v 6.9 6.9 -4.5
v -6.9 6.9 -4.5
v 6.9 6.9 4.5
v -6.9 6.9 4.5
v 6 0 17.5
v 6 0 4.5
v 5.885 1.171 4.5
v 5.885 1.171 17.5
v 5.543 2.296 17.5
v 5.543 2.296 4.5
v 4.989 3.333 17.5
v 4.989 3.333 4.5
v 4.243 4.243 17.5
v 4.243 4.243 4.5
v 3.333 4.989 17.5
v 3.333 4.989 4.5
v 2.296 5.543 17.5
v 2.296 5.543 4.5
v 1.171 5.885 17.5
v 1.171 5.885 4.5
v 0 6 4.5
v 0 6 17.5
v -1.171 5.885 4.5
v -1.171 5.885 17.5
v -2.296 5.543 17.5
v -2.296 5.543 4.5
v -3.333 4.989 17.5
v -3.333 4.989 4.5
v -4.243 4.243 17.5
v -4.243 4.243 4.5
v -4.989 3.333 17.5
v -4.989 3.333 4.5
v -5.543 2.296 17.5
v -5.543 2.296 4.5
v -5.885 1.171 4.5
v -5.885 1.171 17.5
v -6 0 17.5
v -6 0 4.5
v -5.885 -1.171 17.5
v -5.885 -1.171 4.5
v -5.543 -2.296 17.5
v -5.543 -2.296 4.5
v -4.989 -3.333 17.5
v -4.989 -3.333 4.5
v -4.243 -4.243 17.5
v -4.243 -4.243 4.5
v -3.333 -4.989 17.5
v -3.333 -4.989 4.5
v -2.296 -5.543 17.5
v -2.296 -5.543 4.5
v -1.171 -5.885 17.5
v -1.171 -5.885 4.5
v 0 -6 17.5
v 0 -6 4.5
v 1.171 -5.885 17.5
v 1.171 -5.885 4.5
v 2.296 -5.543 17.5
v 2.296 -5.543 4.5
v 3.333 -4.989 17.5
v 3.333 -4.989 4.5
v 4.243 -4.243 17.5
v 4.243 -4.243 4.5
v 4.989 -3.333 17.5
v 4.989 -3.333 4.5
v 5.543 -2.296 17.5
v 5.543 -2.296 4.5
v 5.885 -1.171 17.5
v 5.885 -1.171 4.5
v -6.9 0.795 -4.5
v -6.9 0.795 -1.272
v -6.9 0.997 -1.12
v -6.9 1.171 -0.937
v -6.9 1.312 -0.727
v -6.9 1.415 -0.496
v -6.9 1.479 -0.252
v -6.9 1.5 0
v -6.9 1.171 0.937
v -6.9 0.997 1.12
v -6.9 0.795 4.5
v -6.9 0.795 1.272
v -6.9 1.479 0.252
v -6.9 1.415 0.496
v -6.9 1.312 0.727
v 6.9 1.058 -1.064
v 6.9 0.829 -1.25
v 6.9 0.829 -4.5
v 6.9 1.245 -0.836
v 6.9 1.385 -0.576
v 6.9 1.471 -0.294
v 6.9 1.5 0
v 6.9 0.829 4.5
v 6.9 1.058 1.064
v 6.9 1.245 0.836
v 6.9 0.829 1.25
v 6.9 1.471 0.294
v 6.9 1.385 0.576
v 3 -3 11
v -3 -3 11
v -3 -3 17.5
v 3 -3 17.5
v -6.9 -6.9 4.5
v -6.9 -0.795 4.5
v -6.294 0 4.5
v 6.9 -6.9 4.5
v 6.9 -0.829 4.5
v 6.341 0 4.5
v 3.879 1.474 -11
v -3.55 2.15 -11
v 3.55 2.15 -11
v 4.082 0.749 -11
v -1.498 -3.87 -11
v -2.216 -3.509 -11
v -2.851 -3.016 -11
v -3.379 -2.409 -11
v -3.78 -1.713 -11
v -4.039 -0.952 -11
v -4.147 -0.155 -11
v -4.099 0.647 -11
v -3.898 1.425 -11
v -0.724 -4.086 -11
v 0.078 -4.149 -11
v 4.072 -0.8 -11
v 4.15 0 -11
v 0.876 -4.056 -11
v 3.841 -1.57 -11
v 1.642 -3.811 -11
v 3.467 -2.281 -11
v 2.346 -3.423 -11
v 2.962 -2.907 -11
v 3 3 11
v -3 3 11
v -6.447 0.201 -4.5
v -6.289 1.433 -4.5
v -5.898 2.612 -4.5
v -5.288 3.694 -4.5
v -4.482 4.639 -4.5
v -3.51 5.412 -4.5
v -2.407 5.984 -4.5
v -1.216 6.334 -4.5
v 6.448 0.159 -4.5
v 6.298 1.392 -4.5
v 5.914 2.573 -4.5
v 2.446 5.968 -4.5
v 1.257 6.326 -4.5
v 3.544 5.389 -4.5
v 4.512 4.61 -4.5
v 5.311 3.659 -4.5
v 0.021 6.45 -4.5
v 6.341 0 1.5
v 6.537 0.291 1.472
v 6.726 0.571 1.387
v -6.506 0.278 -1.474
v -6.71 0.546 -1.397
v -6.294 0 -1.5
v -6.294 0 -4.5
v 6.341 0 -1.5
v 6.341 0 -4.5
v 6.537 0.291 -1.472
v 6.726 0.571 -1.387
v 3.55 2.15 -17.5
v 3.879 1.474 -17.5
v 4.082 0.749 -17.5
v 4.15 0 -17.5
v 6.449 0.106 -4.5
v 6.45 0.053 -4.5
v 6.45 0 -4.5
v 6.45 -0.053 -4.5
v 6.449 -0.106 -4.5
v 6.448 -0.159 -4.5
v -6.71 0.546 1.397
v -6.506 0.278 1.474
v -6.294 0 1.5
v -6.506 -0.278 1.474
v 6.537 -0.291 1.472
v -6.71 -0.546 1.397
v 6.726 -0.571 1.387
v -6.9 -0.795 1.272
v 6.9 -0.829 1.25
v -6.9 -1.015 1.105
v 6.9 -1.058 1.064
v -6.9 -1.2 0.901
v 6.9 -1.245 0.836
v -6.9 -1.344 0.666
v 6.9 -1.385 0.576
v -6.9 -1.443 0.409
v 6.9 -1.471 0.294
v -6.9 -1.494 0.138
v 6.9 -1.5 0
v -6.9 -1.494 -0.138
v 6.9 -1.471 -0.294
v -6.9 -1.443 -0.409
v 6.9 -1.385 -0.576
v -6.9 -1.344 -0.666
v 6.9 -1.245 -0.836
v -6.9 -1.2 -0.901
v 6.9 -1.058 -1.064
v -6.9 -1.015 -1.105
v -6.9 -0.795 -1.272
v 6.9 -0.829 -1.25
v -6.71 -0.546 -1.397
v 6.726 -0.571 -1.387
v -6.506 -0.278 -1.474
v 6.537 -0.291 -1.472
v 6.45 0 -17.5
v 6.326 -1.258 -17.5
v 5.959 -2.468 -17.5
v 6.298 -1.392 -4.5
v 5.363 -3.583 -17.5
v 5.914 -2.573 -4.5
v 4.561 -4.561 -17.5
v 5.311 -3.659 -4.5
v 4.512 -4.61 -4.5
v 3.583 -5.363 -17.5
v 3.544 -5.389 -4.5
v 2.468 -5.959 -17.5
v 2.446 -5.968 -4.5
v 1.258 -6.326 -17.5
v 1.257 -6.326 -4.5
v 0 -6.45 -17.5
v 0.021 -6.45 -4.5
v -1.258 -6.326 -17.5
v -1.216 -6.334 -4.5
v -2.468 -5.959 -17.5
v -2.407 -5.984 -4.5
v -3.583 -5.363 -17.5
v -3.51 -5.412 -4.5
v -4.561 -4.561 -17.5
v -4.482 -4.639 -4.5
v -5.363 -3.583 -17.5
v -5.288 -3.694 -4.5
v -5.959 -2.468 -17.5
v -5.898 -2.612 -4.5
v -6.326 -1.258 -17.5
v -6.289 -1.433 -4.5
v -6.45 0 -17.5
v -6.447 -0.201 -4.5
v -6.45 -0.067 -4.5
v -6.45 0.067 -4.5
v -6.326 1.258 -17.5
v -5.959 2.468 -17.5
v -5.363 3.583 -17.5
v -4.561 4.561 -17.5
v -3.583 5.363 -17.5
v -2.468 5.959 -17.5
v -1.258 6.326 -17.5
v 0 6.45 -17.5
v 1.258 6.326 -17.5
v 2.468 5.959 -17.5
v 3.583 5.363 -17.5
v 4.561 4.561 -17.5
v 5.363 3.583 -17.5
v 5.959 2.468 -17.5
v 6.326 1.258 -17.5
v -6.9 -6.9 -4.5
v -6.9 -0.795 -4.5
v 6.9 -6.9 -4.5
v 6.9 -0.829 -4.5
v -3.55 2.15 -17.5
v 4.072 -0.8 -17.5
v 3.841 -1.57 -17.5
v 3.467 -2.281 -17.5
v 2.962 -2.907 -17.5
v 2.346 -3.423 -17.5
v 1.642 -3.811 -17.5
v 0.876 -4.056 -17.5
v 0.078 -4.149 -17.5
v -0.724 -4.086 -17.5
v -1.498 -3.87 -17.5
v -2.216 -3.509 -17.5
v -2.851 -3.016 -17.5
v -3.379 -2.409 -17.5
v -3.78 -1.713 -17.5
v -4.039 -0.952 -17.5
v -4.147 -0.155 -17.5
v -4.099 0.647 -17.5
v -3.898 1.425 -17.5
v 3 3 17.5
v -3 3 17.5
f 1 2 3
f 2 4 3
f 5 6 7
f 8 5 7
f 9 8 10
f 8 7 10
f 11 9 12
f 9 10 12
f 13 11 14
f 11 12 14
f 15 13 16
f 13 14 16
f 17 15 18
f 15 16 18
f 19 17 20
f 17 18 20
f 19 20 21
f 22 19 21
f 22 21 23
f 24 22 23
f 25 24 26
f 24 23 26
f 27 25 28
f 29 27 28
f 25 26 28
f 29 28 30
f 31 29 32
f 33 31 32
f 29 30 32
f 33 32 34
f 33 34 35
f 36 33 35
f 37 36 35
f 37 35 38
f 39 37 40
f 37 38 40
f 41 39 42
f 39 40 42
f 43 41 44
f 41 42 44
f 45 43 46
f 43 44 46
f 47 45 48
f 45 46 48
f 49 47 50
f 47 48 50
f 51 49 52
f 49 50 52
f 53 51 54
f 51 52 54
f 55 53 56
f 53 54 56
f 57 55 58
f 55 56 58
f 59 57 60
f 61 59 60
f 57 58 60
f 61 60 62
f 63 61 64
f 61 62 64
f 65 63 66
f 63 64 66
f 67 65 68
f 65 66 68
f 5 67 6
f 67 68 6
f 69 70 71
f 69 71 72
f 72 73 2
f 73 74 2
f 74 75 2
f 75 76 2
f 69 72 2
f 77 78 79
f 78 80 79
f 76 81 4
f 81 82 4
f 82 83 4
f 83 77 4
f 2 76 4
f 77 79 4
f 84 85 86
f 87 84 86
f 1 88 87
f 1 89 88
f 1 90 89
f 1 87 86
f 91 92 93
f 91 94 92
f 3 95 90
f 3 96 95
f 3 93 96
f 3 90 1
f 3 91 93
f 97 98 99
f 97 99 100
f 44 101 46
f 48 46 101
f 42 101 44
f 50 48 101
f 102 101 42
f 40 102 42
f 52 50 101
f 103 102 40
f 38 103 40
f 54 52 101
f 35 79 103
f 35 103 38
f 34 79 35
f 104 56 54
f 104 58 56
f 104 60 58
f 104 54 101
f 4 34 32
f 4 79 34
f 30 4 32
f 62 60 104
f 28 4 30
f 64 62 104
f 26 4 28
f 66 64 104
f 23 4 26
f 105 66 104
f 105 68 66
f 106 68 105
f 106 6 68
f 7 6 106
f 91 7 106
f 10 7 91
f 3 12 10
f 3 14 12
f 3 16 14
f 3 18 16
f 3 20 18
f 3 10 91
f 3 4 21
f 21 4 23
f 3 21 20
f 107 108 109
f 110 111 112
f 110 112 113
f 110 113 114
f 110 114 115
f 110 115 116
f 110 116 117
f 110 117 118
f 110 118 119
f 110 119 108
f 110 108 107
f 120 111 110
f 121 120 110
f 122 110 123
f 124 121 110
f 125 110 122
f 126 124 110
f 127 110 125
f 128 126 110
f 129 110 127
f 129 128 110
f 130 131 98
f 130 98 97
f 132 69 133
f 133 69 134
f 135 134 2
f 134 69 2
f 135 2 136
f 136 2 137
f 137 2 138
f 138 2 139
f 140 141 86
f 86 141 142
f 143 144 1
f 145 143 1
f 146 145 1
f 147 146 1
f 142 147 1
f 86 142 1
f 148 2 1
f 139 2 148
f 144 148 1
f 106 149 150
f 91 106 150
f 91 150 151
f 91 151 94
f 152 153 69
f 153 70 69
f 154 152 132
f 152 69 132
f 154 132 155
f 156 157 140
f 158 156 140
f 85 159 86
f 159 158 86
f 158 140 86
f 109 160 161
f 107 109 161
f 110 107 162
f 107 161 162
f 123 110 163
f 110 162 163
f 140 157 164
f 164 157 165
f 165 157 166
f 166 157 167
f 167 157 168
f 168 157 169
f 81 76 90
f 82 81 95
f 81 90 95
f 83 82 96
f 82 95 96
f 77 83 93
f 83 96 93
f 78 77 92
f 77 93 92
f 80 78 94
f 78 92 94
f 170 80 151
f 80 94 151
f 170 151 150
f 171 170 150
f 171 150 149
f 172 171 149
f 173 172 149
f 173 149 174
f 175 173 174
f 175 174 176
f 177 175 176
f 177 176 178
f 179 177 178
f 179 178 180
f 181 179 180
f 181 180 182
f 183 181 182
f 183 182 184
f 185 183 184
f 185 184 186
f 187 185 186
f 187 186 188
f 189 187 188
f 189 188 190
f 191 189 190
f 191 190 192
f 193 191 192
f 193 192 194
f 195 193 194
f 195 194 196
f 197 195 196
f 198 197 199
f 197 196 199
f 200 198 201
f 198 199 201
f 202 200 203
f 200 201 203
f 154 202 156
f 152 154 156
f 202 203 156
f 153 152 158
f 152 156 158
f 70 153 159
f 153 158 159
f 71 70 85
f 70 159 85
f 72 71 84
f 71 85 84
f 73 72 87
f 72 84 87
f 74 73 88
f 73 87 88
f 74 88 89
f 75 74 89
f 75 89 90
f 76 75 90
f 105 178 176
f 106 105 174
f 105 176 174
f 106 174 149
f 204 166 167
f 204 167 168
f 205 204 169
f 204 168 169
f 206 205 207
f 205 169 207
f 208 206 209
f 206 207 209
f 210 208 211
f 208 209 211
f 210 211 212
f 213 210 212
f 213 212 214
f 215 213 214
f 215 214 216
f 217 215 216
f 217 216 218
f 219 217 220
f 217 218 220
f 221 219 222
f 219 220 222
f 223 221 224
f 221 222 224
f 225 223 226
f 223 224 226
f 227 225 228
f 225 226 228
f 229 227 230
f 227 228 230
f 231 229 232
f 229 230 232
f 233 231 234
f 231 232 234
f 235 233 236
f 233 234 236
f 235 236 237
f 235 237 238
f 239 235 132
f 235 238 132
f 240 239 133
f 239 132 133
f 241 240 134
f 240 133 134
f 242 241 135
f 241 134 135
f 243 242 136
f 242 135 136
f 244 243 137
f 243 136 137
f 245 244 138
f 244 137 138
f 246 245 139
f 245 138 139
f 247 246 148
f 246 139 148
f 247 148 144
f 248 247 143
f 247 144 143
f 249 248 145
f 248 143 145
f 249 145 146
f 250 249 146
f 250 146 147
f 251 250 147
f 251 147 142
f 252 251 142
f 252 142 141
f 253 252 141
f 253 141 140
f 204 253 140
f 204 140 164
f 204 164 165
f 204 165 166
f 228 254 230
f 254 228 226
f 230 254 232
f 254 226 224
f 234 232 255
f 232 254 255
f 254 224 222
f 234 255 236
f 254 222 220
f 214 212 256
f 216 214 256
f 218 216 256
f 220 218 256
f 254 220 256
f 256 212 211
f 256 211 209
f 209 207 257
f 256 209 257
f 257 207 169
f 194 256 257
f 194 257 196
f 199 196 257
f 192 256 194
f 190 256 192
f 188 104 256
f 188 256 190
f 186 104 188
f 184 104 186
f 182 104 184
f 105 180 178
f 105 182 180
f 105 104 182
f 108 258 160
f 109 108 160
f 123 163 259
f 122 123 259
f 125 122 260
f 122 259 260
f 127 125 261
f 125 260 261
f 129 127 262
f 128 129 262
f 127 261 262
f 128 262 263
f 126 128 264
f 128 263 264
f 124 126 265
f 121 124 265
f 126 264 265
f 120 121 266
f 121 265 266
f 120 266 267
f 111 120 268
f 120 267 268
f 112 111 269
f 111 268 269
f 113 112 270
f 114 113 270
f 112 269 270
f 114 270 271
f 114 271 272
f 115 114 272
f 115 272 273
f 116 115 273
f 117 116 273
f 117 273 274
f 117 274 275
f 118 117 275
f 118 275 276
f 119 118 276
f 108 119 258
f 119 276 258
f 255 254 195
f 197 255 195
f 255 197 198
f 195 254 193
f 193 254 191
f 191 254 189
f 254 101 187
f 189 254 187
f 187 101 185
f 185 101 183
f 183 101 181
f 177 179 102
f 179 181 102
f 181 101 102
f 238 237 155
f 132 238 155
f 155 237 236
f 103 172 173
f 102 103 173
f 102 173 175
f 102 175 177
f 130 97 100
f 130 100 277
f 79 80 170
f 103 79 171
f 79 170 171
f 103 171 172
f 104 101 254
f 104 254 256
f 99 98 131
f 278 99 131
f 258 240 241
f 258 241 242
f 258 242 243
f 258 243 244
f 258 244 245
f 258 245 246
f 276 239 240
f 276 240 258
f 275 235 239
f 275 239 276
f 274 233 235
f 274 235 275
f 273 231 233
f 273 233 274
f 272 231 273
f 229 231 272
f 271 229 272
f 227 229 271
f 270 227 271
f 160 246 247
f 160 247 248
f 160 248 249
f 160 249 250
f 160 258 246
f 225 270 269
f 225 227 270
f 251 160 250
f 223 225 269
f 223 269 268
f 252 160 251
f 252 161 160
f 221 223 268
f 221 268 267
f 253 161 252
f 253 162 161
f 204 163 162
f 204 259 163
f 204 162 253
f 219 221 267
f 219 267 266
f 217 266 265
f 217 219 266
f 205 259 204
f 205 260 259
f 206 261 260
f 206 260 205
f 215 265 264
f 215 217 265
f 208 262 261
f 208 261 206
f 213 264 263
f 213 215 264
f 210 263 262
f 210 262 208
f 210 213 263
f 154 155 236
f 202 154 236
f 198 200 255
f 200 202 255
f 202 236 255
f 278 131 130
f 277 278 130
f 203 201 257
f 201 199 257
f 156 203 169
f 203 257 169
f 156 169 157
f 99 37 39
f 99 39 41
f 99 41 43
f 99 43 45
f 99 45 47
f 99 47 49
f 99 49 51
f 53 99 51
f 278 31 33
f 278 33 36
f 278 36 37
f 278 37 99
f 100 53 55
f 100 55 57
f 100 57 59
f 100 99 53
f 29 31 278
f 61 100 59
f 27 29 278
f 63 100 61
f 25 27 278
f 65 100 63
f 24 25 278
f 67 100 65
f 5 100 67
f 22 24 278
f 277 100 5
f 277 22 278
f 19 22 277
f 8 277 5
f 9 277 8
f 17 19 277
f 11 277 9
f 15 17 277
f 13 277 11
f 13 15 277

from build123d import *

# Parameters (mm, degrees)
F0_W      = 13.8
F0_H      = 13.8
F1_DEPTH  = 4.5
F2_R      = 6
F3_DEPTH  = 13
F4_R      = 6.45
F5_DEPTH  = 13
F6_R      = 1.5
F7_DEPTH  = 13.801
F9_DEPTH  = 22.001
F10_W     = 6
F10_H     = 6
F11_DEPTH = 6.5
F13_DEPTH = 6.5


with BuildPart() as f1:
    # F0 (on Top) → F1 (new body, symmetric)
    with BuildSketch(Plane.XY):
        Rectangle(F0_W, F0_H)
    extrude(amount=F1_DEPTH, both=True)

    # F2 (on face) → F3 (join)
    with BuildSketch(Plane.XY.offset(4.5)):
        Circle(F2_R)
    extrude(amount=F3_DEPTH)

    # F4 (on face) → F5 (join)
    with BuildSketch(Plane(origin=(0, 0, -4.5), x_dir=(1, 0, 0), z_dir=(0, 0, -1))):
        Circle(F4_R)
    extrude(amount=F5_DEPTH)

    # F6 (on face) → F7 (cut, through all)
    with BuildSketch(Plane.YZ.offset(6.9)):
        Circle(F6_R)
    extrude(amount=-F7_DEPTH, mode=Mode.SUBTRACT)

    # F8 (on face) → F9 (cut, through all)
    with BuildSketch(Plane(origin=(0, 0, -4.5), x_dir=(1, 0, 0), z_dir=(0, 0, -1))):
        Polygon((6.9, 0.8288529099), (6.3405334204, 0), (6.9, -0.8288529099), align=None)
        Polygon((-6.9, -0.7952927344), (-6.2937744095, 0), (-6.9, 0.7952927344), align=None)
    extrude(amount=-F9_DEPTH, mode=Mode.SUBTRACT)

    # F10 (on face) → F11 (cut)
    with BuildSketch(Plane.XY.offset(17.5)):
        Rectangle(F10_W, F10_H)
    extrude(amount=-F11_DEPTH, mode=Mode.SUBTRACT)

    # F12 (on face) → F13 (cut)
    with BuildSketch(Plane(origin=(0, 0, -17.5), x_dir=(1, 0, 0), z_dir=(0, 0, -1))):
        with BuildLine():
            ThreePointArc((3.5496478699, -2.15), (3.9970951114, -1.1161230533), (4.15, 0))
            ThreePointArc((4.15, 0), (-1.1161230533, 3.9970951114), (-3.5496478699, -2.15))
            Line((-3.5496478699, -2.15), (0, -2.15))
            Line((0, -2.15), (3.5496478699, -2.15))
        make_face()
    extrude(amount=-F13_DEPTH, mode=Mode.SUBTRACT)


solid = f1.part
